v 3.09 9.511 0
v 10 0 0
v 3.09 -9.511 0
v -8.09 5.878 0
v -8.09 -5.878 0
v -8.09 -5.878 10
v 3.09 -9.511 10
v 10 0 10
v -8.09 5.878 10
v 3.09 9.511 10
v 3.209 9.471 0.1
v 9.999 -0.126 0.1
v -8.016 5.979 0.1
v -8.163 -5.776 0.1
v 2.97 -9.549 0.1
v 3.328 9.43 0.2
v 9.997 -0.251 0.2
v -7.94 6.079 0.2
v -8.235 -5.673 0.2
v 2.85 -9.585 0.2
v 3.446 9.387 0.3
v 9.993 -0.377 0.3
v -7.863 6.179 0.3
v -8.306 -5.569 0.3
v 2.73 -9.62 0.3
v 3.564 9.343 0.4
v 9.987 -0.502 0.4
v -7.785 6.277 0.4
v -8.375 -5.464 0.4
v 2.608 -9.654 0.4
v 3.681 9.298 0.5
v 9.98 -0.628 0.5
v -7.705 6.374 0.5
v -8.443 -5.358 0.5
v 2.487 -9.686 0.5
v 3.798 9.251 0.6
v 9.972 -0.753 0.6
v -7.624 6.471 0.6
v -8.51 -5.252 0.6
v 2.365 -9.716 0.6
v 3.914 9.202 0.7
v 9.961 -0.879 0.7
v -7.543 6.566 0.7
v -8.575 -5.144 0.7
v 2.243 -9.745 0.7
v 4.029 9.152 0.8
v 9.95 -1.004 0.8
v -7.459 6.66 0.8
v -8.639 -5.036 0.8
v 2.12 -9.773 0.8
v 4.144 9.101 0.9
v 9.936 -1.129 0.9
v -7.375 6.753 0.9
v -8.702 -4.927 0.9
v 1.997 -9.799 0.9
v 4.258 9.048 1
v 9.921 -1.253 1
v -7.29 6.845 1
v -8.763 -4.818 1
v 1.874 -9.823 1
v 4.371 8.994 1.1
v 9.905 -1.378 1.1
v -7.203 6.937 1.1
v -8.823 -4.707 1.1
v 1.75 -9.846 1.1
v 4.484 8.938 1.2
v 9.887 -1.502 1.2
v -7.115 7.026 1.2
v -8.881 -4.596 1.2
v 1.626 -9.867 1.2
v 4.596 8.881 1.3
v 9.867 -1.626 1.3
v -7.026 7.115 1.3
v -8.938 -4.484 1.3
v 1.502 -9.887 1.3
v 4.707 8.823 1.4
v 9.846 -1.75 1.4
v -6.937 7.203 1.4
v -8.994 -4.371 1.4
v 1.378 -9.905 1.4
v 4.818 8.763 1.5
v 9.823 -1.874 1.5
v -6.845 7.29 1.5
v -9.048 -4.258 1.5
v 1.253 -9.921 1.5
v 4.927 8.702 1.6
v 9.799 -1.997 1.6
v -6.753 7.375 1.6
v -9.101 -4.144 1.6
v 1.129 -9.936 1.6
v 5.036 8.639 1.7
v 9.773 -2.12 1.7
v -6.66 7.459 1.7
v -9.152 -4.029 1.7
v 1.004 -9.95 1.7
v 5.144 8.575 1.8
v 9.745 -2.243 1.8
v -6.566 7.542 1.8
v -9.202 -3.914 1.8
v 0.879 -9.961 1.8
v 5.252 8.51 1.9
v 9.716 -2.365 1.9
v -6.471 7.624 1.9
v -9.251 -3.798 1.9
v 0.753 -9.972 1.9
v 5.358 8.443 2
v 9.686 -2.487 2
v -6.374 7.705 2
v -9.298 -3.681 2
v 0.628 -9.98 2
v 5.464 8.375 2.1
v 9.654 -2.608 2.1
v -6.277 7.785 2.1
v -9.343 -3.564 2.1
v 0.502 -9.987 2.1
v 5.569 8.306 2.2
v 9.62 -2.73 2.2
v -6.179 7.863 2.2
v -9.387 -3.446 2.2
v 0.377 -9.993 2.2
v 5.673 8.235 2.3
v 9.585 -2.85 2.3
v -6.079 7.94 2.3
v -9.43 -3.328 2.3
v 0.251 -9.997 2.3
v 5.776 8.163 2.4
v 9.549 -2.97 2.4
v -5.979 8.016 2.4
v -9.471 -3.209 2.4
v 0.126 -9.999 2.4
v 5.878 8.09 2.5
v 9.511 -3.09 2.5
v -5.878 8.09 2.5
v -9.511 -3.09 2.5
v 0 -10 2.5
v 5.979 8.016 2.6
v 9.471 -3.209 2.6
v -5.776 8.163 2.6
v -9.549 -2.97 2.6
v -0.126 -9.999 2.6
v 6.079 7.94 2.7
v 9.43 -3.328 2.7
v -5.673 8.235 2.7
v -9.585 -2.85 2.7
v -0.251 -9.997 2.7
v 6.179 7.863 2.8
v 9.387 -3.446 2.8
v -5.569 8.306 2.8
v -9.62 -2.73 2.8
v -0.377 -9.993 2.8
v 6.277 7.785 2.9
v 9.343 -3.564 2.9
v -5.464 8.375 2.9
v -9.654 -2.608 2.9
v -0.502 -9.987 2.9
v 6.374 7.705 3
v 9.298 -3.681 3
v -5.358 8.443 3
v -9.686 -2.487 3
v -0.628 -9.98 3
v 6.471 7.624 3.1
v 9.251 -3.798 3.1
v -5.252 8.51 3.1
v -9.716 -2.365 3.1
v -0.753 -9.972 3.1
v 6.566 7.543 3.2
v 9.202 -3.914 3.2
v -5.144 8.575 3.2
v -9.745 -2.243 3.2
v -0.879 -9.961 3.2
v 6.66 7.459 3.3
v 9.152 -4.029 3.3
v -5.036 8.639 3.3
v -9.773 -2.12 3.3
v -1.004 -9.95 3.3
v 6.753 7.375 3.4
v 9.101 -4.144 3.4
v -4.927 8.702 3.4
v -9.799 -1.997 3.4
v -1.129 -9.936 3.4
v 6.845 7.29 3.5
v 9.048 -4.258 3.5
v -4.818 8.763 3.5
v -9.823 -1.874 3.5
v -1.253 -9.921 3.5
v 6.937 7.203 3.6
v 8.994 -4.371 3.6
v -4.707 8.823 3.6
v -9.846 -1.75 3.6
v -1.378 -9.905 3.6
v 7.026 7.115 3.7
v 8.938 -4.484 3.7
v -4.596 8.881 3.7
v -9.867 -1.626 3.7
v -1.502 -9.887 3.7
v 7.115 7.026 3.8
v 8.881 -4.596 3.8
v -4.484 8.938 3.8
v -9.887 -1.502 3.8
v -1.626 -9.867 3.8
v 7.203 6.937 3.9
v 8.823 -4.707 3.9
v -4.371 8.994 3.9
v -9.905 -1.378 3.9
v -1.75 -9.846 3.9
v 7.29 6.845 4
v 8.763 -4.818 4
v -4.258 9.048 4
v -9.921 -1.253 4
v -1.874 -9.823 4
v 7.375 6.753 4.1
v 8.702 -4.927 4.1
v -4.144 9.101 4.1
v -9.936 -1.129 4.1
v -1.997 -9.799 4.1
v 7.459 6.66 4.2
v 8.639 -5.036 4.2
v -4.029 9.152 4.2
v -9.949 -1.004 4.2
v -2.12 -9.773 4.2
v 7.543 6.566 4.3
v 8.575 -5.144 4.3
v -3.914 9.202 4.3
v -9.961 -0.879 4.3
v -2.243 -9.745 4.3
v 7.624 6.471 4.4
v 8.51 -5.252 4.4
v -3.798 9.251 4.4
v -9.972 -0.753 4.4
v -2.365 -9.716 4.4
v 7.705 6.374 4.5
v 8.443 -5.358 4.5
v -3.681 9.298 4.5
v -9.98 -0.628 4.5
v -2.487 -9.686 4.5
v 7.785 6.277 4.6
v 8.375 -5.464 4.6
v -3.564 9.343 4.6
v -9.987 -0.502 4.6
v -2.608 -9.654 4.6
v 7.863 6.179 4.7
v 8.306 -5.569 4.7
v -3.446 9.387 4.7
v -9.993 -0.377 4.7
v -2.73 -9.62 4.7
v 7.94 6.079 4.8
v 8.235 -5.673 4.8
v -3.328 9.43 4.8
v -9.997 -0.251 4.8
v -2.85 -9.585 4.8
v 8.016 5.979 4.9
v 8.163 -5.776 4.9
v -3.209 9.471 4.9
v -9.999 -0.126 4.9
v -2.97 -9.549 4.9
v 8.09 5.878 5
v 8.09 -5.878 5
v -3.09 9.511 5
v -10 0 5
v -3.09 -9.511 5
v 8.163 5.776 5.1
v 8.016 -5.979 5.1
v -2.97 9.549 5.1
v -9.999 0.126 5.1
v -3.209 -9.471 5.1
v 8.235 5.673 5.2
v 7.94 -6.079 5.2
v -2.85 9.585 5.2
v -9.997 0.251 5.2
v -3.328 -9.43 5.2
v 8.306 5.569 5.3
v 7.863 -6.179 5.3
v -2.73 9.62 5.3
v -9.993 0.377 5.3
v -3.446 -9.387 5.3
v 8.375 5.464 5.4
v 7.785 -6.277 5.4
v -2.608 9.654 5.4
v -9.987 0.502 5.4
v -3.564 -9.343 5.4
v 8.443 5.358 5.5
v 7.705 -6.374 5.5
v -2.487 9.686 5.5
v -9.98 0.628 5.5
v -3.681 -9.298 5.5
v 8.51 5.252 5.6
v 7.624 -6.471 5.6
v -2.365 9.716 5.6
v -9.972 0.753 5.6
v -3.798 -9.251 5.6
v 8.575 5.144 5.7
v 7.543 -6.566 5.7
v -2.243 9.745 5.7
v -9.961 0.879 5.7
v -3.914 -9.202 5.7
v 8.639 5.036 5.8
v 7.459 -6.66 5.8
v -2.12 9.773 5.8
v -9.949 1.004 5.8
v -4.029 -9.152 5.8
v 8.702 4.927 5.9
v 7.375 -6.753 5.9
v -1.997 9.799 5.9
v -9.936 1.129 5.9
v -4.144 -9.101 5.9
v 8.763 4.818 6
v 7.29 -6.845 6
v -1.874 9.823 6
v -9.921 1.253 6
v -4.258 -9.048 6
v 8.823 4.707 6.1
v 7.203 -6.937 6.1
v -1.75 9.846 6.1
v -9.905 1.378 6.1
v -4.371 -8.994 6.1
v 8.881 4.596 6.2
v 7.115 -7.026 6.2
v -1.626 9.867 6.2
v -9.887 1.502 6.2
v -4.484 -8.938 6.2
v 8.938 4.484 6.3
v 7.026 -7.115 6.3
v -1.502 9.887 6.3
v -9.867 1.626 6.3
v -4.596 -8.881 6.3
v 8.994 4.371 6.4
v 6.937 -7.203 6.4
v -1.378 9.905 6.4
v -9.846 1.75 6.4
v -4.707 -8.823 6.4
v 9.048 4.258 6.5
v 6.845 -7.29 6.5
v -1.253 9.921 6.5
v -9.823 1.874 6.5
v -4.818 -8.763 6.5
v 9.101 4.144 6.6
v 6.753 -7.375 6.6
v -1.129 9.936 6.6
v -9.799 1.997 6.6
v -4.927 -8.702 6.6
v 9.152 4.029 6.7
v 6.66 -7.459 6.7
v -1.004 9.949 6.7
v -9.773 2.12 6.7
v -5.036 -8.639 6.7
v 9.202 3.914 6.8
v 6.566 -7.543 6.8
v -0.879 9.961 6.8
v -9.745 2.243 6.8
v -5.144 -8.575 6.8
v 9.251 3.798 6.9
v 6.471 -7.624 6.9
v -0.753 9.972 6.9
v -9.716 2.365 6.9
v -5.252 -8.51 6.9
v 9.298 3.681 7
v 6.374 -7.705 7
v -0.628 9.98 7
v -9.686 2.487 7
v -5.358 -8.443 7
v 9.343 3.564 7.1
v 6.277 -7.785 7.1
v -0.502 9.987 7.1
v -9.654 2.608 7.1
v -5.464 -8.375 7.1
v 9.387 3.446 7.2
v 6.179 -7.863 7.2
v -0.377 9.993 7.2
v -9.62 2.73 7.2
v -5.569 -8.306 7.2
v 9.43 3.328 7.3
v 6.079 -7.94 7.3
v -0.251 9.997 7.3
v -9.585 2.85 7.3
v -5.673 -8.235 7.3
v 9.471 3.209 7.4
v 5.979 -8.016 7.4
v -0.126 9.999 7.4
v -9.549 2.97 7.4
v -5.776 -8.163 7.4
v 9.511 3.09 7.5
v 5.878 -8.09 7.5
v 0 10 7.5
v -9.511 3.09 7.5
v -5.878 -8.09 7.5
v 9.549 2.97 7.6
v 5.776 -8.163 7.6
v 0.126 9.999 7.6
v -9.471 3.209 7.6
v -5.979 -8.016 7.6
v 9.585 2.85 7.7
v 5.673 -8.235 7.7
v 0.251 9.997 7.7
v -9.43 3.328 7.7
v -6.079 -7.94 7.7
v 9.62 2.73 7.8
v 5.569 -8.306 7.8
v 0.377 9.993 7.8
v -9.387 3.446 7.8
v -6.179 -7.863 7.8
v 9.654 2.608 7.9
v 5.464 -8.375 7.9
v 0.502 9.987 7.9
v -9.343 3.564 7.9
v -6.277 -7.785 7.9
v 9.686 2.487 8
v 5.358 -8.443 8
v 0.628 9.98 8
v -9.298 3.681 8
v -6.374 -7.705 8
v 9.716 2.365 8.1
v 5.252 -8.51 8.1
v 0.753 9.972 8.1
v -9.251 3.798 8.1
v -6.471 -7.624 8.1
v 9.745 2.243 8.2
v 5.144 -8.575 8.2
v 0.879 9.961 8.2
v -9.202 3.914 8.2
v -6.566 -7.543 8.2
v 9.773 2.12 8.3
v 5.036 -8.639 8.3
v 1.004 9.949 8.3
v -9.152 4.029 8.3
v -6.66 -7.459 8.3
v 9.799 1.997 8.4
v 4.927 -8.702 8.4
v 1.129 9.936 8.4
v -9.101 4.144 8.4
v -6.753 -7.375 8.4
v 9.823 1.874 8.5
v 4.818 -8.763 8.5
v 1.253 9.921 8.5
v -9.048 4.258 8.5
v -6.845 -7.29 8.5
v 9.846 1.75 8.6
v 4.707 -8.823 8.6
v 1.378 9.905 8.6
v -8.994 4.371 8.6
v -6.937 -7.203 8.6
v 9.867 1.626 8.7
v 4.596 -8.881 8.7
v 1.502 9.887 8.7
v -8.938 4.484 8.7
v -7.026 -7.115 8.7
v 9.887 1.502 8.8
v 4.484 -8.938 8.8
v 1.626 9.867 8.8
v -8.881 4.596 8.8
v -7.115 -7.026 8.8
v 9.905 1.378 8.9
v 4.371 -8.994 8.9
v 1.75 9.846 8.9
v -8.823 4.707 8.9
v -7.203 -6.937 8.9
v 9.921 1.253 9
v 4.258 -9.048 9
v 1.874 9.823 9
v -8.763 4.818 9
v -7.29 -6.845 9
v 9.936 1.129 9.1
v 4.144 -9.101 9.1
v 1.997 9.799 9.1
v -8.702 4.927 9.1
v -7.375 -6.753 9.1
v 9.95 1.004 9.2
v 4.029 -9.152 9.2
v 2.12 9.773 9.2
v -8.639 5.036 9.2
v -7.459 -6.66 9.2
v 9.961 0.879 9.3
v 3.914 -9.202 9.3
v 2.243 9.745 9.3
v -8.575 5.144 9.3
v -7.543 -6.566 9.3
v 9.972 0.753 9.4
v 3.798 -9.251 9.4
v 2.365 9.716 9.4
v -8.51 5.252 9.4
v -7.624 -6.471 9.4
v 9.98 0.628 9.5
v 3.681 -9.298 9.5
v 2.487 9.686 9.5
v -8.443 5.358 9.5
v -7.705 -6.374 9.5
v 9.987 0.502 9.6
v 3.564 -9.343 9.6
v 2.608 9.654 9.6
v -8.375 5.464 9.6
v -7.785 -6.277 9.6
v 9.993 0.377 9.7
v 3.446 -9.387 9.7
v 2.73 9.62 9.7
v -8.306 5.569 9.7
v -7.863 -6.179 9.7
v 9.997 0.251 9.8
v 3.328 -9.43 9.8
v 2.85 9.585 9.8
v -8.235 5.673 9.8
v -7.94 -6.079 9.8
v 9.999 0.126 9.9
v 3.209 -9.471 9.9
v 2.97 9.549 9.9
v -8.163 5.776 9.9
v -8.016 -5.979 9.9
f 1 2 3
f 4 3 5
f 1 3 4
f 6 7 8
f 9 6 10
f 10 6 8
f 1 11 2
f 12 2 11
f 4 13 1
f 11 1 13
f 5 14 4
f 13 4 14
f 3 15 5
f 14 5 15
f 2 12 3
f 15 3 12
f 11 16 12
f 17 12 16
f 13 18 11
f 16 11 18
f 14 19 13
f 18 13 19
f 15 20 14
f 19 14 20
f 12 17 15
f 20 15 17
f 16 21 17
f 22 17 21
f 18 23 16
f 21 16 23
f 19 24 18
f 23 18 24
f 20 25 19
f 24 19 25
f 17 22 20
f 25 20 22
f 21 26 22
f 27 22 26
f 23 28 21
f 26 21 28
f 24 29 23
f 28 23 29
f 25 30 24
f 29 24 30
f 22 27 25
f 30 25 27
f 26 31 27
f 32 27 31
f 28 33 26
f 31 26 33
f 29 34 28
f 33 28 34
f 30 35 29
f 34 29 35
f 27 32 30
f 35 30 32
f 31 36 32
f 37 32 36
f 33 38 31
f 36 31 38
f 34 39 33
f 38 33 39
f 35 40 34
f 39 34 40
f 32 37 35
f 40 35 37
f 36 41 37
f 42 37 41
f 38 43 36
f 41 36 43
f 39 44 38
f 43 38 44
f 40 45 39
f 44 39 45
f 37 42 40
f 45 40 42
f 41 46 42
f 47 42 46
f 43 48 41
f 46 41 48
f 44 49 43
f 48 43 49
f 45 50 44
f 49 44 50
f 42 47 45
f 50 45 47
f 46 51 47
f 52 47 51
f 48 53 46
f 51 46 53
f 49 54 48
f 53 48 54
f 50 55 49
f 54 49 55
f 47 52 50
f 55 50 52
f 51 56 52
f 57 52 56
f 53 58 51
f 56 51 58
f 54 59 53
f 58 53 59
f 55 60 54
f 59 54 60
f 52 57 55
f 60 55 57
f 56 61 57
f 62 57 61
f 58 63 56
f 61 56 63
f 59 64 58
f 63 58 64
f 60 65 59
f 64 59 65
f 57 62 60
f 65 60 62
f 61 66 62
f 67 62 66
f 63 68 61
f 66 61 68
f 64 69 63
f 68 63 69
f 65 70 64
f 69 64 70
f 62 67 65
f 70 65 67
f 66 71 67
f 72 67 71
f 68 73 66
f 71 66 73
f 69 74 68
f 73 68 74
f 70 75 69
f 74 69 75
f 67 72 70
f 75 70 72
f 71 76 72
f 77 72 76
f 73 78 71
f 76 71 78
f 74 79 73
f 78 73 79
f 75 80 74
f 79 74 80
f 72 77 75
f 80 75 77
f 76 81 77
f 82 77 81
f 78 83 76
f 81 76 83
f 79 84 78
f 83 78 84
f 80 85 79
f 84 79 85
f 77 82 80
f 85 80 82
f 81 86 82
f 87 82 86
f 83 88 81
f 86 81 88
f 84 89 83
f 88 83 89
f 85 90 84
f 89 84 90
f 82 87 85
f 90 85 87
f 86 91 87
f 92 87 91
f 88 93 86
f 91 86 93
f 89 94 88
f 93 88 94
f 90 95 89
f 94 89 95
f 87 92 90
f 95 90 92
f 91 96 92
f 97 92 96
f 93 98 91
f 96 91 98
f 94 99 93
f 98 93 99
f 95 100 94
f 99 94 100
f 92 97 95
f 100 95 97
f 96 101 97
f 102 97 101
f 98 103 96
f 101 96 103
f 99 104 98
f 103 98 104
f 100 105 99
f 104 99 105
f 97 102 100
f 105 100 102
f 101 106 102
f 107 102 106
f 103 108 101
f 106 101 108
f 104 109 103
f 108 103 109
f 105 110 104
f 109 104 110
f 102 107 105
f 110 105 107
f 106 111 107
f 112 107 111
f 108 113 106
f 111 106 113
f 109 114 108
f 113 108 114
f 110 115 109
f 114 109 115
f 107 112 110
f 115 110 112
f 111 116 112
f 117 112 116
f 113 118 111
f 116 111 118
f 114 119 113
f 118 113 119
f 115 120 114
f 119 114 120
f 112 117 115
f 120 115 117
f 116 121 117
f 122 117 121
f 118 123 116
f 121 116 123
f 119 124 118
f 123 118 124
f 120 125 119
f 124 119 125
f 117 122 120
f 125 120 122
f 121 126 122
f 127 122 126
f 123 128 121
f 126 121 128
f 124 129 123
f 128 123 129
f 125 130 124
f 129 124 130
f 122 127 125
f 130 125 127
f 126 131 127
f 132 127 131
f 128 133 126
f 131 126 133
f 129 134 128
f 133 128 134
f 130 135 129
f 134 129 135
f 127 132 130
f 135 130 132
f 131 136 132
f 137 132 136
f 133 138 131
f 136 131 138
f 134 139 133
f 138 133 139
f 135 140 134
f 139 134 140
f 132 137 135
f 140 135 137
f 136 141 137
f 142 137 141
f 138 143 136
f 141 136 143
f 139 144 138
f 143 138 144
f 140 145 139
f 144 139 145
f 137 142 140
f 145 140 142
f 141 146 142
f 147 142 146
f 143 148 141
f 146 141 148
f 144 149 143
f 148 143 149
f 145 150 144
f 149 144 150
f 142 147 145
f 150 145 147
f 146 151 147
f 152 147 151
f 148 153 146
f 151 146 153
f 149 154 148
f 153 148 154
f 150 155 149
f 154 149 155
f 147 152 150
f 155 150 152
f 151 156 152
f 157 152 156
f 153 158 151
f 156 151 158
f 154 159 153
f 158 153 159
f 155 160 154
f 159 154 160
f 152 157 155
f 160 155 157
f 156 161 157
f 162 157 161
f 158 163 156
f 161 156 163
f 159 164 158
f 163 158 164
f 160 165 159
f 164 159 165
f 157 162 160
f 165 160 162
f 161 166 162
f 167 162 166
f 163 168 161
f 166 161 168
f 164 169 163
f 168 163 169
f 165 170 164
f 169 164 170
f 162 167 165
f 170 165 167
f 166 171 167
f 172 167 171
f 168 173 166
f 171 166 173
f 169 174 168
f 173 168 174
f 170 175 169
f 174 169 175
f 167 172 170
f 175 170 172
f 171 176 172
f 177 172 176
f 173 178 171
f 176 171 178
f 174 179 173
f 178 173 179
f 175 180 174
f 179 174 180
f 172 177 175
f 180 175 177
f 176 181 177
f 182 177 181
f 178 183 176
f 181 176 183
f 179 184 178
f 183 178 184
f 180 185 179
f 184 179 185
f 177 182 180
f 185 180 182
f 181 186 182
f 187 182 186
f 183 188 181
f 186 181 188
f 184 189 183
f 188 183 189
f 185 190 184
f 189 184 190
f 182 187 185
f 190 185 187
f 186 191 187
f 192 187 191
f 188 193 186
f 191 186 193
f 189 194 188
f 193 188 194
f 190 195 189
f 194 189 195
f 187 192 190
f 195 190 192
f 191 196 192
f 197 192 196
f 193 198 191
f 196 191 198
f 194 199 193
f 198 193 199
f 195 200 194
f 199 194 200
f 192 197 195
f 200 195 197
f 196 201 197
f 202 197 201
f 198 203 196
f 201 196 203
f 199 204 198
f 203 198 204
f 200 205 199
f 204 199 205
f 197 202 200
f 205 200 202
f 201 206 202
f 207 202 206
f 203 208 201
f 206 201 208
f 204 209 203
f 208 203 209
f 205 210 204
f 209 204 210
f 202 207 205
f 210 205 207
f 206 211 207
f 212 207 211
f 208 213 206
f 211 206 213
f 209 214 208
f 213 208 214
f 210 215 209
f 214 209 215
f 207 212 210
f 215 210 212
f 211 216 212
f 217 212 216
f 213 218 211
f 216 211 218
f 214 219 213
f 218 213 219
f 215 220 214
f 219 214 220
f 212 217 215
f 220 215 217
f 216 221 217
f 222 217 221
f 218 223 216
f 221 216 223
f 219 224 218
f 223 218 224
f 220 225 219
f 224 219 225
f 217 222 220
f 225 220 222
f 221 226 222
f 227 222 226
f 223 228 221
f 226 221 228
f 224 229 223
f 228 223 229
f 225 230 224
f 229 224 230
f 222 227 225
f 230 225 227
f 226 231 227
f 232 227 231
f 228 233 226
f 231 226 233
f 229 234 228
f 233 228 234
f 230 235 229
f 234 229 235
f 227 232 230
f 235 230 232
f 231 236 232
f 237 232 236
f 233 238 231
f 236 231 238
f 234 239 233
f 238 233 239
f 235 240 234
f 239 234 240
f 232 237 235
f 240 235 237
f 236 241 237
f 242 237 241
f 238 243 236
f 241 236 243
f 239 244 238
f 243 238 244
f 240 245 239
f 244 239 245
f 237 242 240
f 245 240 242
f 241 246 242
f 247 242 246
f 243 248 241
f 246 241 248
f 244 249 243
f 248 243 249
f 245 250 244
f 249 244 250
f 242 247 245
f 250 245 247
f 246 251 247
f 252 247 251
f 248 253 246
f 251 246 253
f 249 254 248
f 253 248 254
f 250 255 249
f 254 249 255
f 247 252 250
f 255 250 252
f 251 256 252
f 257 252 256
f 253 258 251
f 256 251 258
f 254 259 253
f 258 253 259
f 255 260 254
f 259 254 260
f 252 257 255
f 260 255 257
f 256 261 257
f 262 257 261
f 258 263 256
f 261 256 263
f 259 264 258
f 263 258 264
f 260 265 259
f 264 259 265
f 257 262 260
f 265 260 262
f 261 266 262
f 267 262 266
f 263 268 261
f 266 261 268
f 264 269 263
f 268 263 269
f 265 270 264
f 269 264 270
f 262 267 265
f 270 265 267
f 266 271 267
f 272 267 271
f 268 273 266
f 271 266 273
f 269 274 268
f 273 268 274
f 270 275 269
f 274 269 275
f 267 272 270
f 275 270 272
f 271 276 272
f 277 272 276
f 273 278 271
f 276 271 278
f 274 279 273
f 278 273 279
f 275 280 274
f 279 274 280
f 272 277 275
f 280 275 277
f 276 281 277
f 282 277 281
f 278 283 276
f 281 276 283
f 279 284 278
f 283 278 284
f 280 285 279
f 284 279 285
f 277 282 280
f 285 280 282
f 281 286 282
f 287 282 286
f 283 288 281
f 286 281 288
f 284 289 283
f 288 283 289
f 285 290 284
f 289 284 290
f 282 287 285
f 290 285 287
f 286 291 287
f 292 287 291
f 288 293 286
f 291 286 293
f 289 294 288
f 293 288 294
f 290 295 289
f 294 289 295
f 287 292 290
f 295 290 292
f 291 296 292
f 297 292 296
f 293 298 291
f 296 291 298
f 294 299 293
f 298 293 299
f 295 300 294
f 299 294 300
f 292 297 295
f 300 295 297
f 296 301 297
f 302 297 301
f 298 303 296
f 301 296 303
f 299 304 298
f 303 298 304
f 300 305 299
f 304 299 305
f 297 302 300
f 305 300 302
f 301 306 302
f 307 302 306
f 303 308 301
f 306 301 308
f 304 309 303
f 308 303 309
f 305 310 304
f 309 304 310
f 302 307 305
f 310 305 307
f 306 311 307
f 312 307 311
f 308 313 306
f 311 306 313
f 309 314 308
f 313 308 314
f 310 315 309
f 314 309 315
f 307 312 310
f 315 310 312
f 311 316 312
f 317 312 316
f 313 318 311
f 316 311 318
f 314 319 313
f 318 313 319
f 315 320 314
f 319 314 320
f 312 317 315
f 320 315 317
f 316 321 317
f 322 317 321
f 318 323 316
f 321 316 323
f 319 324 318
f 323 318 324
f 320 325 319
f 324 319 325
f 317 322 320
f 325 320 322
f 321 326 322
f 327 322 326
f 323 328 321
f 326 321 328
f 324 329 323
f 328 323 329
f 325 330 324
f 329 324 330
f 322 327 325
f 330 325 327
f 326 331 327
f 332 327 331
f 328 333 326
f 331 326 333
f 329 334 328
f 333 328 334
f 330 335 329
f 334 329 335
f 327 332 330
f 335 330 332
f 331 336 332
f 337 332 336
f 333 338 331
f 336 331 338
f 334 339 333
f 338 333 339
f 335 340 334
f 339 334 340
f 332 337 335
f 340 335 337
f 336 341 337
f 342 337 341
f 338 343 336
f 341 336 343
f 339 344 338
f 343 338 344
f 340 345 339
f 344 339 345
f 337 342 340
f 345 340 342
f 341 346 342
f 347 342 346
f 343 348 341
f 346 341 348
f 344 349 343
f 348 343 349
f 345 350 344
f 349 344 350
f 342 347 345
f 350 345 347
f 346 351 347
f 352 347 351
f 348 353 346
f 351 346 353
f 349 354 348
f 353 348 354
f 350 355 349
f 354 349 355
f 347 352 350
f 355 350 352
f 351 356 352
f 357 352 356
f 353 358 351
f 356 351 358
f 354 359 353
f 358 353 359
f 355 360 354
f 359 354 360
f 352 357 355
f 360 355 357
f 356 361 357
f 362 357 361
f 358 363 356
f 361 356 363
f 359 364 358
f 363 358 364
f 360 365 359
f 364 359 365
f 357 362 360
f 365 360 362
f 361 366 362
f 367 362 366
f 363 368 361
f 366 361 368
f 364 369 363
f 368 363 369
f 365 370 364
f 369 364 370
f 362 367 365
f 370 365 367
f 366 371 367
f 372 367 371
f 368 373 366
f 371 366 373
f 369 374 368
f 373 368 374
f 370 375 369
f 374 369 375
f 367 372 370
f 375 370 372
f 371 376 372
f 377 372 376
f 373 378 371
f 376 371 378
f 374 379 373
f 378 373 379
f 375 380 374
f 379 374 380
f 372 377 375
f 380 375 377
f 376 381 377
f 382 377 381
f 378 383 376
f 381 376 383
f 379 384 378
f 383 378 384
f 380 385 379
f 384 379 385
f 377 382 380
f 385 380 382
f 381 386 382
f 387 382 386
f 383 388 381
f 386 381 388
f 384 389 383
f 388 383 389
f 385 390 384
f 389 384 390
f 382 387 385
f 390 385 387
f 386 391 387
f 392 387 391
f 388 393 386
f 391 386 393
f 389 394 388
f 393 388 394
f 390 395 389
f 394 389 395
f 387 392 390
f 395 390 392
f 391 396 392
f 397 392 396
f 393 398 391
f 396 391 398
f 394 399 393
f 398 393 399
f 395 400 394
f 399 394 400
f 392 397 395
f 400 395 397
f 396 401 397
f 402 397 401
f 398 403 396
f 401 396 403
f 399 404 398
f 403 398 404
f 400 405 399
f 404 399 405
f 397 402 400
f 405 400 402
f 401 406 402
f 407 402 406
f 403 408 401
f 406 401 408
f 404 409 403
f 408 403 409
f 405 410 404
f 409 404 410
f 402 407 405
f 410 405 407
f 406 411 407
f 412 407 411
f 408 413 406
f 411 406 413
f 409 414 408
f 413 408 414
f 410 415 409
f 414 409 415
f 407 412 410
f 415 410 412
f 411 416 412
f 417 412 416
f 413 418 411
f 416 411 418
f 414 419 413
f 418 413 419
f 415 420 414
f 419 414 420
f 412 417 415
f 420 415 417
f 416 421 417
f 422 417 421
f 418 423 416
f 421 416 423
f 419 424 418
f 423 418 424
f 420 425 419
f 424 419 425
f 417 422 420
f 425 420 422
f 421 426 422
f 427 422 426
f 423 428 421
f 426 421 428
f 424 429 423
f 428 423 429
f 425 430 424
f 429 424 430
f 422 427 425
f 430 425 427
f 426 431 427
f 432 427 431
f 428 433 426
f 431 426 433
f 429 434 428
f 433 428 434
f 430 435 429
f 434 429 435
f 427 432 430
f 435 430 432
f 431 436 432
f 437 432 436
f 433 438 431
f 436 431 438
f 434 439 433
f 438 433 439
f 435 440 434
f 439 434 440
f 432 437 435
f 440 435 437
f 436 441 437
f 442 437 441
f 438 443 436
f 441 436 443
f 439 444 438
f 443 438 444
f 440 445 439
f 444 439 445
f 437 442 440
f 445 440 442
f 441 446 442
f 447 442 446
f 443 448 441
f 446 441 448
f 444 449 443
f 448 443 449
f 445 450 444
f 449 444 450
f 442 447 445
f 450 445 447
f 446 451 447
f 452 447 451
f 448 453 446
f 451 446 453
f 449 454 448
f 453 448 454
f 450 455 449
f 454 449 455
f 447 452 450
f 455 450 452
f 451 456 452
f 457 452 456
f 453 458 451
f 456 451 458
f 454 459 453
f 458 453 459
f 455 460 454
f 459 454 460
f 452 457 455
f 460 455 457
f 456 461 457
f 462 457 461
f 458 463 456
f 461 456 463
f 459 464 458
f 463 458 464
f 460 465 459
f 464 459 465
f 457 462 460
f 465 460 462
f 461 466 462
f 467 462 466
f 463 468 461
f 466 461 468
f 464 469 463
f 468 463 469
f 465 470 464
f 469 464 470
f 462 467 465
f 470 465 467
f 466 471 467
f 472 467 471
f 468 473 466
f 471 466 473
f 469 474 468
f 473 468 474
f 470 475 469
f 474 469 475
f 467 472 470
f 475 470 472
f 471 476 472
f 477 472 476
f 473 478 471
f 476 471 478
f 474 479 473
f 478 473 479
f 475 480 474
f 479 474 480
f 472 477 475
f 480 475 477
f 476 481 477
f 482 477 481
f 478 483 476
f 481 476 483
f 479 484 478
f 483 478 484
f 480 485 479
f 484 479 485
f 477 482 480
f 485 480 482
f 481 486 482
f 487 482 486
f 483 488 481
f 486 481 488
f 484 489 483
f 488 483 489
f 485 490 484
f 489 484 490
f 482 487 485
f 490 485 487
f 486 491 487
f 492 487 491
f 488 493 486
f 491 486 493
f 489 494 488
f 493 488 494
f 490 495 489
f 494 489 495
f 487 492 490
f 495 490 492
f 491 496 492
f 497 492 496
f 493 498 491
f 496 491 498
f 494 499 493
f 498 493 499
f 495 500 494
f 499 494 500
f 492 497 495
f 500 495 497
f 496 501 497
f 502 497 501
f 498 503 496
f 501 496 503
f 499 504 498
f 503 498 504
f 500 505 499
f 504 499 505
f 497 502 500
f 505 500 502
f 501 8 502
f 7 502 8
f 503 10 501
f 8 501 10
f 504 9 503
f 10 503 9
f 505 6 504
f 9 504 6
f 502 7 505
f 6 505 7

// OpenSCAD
linear_extrude( height = 10, center = false, convexity = 10, twist = 72, slices = 100, scale = 1){
	difference(){
		scale([10,10,1]){
			circle(1);
		}
		fillet(5,5);
	}
}

module fillet( r, h){
	translate([ r/2, r/2, 0])

		difference(){
			cube([ r + 0.01, r + 0.01, h], center = true);

			translate([ r/2, r/2, 0])
				cylinder( r = r, h = h, center = true);
		}
}
